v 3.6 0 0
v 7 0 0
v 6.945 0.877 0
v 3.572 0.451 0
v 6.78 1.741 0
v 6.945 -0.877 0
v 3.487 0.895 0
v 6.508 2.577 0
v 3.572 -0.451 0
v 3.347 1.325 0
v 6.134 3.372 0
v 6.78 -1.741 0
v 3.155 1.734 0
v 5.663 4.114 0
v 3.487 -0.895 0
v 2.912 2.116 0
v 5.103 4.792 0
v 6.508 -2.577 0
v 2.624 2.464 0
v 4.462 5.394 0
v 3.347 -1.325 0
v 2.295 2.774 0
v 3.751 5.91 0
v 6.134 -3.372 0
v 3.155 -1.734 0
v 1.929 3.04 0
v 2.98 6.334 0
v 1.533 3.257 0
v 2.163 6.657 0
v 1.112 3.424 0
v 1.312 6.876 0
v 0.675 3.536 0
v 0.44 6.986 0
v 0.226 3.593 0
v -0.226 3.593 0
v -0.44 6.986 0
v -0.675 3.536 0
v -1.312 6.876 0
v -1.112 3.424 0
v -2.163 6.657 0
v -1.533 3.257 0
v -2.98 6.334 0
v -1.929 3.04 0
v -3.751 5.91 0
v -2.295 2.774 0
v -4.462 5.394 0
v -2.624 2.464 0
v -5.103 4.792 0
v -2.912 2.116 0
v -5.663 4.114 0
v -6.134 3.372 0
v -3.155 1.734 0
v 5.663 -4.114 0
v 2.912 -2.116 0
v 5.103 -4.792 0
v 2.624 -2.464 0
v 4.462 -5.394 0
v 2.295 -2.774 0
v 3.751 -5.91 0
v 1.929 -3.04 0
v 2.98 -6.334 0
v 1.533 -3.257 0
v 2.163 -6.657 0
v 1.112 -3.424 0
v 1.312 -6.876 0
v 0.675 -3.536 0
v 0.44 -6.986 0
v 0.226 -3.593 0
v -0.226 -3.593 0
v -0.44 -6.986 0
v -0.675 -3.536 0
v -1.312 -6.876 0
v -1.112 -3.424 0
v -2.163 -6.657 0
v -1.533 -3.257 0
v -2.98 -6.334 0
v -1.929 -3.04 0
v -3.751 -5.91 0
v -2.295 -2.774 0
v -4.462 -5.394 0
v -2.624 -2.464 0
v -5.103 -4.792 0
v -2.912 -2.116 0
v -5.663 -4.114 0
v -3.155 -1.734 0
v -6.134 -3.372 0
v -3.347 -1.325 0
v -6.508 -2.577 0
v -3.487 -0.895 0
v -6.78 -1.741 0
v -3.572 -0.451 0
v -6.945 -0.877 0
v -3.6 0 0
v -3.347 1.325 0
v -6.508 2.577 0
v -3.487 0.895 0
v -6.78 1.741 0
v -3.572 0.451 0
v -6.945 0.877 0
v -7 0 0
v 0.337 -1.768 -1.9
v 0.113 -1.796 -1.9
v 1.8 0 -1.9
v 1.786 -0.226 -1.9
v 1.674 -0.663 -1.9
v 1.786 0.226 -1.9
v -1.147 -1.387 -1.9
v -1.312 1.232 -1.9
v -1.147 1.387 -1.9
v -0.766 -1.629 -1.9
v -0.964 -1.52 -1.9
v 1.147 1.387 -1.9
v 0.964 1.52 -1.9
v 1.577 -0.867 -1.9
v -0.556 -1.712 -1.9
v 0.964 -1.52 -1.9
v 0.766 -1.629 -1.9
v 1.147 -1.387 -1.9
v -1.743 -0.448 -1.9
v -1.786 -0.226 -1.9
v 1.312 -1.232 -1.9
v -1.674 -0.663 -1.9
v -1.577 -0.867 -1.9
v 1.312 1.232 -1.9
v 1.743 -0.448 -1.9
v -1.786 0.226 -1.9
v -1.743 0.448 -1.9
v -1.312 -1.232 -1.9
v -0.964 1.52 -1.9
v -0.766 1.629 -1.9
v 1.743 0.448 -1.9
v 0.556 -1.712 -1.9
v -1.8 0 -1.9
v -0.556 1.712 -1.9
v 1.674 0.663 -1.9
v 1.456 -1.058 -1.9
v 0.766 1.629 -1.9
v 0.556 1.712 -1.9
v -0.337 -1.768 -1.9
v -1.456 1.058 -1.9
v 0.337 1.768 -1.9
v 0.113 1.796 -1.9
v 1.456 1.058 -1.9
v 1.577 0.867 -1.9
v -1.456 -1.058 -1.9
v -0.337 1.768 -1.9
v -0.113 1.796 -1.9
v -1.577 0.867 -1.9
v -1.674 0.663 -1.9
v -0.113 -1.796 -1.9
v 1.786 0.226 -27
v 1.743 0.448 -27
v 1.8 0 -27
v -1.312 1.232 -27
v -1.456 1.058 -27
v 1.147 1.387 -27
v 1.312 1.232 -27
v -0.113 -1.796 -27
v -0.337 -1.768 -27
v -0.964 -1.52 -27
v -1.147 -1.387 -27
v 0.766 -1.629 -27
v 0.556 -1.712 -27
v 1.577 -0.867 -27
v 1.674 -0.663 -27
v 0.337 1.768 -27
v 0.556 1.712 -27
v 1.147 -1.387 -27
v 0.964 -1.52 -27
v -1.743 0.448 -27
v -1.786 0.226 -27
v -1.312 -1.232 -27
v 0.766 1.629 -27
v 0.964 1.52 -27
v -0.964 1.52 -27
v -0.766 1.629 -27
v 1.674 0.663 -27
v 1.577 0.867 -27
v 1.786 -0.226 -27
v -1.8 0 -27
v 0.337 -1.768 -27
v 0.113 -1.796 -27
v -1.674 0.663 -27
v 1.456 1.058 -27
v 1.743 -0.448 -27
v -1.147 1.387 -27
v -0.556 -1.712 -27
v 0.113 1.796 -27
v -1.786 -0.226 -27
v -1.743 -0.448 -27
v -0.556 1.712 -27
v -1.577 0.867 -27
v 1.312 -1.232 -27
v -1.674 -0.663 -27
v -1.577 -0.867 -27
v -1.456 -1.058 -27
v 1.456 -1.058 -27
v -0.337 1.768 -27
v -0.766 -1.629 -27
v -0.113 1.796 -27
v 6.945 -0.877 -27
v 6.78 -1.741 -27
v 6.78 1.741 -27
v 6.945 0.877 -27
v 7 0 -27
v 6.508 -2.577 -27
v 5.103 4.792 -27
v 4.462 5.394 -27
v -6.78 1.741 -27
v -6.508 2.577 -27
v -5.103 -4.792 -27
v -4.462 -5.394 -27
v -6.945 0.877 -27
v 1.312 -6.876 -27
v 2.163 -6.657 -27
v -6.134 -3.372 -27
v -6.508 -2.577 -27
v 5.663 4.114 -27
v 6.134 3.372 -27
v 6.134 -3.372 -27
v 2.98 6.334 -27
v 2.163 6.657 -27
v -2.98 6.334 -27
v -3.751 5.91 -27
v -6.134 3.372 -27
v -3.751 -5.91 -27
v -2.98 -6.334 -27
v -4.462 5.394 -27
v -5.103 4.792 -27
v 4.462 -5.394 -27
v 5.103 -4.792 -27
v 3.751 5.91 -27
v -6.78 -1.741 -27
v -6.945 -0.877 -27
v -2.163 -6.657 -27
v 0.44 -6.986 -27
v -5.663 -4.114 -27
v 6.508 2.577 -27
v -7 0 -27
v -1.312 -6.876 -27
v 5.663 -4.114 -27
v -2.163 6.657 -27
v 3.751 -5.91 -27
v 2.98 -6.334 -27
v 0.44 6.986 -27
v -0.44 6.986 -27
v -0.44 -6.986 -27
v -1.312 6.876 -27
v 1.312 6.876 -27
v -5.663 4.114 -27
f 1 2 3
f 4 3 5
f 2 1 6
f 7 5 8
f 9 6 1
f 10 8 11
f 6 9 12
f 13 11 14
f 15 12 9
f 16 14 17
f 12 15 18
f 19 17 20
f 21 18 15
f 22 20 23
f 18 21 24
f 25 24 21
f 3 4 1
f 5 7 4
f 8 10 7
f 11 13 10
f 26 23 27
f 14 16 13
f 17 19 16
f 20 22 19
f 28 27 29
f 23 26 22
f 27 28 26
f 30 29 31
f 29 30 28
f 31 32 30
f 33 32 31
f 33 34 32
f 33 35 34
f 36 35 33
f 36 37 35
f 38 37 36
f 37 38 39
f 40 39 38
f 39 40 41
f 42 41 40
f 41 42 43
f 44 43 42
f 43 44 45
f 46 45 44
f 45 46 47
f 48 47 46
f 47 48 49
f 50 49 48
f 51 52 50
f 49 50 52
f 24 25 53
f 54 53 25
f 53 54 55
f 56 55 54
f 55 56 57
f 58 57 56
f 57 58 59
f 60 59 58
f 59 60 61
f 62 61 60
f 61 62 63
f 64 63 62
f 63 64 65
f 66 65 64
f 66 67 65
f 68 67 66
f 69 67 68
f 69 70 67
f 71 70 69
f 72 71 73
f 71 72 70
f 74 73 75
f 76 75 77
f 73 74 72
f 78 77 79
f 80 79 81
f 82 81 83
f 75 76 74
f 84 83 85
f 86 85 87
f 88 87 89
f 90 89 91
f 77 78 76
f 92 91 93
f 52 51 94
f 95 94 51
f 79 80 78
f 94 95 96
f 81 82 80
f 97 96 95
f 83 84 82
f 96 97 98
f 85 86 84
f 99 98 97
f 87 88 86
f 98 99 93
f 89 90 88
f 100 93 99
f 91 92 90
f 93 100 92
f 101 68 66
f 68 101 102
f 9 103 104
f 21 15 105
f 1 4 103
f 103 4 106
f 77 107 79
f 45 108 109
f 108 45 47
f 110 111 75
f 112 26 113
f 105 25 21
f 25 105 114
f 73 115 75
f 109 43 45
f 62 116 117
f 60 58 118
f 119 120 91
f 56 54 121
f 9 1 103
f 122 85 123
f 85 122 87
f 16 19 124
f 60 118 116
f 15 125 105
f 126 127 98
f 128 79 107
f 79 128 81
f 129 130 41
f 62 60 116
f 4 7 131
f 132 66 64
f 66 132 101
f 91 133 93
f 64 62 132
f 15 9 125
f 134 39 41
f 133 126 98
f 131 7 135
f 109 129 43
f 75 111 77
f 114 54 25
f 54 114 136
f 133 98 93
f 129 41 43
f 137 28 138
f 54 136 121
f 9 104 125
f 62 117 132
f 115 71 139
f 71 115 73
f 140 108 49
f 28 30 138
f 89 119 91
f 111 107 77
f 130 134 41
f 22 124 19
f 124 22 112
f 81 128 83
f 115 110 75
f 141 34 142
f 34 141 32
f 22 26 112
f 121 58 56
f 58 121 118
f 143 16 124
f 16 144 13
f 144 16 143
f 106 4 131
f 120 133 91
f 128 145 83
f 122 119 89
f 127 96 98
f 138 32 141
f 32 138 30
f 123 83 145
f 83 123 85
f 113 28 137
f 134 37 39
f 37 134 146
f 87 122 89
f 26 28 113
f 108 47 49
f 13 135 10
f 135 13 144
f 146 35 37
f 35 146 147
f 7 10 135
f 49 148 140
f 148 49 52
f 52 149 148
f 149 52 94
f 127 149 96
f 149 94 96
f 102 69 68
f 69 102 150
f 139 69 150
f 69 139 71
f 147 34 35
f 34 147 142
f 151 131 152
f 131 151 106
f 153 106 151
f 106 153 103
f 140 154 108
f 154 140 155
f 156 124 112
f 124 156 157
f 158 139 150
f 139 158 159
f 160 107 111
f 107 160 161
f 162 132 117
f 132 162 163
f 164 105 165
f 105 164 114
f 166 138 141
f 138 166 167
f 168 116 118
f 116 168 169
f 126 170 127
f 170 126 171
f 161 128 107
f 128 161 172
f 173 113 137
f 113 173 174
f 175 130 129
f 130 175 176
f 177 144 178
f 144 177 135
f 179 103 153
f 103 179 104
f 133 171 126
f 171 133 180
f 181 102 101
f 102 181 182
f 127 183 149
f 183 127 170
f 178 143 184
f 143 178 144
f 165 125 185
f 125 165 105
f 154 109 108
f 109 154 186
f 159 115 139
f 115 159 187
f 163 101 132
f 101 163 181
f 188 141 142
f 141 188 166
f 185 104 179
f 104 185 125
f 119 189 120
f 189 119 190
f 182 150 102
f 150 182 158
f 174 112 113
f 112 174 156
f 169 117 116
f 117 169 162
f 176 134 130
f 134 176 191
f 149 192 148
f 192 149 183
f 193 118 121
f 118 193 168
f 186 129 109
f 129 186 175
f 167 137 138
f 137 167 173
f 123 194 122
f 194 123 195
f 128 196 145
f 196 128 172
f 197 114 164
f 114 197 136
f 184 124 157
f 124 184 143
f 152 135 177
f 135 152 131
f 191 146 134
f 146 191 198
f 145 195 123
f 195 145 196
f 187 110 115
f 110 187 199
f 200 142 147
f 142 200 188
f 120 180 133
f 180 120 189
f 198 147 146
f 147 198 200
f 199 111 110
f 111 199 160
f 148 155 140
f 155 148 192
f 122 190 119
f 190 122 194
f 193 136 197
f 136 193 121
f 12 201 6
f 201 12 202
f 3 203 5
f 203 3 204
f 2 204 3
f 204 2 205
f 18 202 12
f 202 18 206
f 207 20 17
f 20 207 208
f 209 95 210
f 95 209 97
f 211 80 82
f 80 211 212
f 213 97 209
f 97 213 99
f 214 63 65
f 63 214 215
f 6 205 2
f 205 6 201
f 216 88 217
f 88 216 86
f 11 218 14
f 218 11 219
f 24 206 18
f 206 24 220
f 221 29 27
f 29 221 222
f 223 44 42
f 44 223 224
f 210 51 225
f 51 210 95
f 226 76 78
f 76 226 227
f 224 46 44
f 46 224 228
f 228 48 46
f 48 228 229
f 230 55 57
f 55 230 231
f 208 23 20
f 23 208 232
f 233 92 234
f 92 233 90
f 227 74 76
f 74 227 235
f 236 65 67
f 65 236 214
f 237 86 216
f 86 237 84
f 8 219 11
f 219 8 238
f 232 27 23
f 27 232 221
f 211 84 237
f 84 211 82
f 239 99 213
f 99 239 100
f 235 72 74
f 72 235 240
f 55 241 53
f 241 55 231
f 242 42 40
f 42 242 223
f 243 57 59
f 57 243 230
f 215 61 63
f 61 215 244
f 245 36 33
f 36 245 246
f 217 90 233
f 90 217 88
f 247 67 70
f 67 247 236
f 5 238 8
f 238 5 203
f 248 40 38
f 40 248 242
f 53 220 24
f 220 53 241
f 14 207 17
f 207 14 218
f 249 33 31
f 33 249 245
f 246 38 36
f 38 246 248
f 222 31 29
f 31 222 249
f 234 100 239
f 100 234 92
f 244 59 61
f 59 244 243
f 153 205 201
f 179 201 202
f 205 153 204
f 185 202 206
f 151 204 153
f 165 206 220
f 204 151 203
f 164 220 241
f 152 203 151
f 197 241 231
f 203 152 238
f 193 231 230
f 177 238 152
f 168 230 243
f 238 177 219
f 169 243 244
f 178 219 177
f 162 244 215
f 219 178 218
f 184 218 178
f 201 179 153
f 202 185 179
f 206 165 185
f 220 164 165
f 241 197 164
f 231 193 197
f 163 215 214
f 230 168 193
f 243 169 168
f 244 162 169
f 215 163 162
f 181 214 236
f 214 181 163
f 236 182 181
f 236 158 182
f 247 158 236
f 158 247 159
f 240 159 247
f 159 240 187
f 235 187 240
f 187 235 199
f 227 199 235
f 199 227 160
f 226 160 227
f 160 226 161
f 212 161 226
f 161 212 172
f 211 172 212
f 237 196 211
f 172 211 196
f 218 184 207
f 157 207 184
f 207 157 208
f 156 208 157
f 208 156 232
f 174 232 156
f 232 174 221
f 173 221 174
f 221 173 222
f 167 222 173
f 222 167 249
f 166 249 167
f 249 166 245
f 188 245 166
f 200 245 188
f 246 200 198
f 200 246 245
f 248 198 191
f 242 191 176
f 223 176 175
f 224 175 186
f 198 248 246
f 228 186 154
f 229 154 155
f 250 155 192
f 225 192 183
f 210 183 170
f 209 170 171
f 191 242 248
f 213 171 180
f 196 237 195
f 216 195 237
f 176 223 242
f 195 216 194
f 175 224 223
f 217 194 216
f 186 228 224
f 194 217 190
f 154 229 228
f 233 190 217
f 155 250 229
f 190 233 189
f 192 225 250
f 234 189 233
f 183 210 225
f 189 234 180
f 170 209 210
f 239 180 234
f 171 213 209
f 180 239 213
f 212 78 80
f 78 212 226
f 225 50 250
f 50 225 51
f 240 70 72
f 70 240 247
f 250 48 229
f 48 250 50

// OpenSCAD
$fn = 50;

difference() {
	union() {
		translate(v = [0, 0, -27.0]) {
			cylinder(h = 27, r = 7.0);
		}
	}
	union() {
		translate(v = [0, 0, 0]) {
			rotate(a = [0, 0, 0]) {
				difference() {
					union() {
						translate(v = [0, 0, -30.0]) {
							cylinder(h = 30, r = 1.5);
						}
						translate(v = [0, 0, -1.9]) {
							cylinder(h = 1.9, r1 = 1.8, r2 = 3.6);
						}
						translate(v = [0, 0, -30.0]) {
							cylinder(h = 30, r = 1.8);
						}
						translate(v = [0, 0, -30.0]) {
							cylinder(h = 30, r = 1.5);
						}
					}
					union();
				}
			}
		}
	}
}
